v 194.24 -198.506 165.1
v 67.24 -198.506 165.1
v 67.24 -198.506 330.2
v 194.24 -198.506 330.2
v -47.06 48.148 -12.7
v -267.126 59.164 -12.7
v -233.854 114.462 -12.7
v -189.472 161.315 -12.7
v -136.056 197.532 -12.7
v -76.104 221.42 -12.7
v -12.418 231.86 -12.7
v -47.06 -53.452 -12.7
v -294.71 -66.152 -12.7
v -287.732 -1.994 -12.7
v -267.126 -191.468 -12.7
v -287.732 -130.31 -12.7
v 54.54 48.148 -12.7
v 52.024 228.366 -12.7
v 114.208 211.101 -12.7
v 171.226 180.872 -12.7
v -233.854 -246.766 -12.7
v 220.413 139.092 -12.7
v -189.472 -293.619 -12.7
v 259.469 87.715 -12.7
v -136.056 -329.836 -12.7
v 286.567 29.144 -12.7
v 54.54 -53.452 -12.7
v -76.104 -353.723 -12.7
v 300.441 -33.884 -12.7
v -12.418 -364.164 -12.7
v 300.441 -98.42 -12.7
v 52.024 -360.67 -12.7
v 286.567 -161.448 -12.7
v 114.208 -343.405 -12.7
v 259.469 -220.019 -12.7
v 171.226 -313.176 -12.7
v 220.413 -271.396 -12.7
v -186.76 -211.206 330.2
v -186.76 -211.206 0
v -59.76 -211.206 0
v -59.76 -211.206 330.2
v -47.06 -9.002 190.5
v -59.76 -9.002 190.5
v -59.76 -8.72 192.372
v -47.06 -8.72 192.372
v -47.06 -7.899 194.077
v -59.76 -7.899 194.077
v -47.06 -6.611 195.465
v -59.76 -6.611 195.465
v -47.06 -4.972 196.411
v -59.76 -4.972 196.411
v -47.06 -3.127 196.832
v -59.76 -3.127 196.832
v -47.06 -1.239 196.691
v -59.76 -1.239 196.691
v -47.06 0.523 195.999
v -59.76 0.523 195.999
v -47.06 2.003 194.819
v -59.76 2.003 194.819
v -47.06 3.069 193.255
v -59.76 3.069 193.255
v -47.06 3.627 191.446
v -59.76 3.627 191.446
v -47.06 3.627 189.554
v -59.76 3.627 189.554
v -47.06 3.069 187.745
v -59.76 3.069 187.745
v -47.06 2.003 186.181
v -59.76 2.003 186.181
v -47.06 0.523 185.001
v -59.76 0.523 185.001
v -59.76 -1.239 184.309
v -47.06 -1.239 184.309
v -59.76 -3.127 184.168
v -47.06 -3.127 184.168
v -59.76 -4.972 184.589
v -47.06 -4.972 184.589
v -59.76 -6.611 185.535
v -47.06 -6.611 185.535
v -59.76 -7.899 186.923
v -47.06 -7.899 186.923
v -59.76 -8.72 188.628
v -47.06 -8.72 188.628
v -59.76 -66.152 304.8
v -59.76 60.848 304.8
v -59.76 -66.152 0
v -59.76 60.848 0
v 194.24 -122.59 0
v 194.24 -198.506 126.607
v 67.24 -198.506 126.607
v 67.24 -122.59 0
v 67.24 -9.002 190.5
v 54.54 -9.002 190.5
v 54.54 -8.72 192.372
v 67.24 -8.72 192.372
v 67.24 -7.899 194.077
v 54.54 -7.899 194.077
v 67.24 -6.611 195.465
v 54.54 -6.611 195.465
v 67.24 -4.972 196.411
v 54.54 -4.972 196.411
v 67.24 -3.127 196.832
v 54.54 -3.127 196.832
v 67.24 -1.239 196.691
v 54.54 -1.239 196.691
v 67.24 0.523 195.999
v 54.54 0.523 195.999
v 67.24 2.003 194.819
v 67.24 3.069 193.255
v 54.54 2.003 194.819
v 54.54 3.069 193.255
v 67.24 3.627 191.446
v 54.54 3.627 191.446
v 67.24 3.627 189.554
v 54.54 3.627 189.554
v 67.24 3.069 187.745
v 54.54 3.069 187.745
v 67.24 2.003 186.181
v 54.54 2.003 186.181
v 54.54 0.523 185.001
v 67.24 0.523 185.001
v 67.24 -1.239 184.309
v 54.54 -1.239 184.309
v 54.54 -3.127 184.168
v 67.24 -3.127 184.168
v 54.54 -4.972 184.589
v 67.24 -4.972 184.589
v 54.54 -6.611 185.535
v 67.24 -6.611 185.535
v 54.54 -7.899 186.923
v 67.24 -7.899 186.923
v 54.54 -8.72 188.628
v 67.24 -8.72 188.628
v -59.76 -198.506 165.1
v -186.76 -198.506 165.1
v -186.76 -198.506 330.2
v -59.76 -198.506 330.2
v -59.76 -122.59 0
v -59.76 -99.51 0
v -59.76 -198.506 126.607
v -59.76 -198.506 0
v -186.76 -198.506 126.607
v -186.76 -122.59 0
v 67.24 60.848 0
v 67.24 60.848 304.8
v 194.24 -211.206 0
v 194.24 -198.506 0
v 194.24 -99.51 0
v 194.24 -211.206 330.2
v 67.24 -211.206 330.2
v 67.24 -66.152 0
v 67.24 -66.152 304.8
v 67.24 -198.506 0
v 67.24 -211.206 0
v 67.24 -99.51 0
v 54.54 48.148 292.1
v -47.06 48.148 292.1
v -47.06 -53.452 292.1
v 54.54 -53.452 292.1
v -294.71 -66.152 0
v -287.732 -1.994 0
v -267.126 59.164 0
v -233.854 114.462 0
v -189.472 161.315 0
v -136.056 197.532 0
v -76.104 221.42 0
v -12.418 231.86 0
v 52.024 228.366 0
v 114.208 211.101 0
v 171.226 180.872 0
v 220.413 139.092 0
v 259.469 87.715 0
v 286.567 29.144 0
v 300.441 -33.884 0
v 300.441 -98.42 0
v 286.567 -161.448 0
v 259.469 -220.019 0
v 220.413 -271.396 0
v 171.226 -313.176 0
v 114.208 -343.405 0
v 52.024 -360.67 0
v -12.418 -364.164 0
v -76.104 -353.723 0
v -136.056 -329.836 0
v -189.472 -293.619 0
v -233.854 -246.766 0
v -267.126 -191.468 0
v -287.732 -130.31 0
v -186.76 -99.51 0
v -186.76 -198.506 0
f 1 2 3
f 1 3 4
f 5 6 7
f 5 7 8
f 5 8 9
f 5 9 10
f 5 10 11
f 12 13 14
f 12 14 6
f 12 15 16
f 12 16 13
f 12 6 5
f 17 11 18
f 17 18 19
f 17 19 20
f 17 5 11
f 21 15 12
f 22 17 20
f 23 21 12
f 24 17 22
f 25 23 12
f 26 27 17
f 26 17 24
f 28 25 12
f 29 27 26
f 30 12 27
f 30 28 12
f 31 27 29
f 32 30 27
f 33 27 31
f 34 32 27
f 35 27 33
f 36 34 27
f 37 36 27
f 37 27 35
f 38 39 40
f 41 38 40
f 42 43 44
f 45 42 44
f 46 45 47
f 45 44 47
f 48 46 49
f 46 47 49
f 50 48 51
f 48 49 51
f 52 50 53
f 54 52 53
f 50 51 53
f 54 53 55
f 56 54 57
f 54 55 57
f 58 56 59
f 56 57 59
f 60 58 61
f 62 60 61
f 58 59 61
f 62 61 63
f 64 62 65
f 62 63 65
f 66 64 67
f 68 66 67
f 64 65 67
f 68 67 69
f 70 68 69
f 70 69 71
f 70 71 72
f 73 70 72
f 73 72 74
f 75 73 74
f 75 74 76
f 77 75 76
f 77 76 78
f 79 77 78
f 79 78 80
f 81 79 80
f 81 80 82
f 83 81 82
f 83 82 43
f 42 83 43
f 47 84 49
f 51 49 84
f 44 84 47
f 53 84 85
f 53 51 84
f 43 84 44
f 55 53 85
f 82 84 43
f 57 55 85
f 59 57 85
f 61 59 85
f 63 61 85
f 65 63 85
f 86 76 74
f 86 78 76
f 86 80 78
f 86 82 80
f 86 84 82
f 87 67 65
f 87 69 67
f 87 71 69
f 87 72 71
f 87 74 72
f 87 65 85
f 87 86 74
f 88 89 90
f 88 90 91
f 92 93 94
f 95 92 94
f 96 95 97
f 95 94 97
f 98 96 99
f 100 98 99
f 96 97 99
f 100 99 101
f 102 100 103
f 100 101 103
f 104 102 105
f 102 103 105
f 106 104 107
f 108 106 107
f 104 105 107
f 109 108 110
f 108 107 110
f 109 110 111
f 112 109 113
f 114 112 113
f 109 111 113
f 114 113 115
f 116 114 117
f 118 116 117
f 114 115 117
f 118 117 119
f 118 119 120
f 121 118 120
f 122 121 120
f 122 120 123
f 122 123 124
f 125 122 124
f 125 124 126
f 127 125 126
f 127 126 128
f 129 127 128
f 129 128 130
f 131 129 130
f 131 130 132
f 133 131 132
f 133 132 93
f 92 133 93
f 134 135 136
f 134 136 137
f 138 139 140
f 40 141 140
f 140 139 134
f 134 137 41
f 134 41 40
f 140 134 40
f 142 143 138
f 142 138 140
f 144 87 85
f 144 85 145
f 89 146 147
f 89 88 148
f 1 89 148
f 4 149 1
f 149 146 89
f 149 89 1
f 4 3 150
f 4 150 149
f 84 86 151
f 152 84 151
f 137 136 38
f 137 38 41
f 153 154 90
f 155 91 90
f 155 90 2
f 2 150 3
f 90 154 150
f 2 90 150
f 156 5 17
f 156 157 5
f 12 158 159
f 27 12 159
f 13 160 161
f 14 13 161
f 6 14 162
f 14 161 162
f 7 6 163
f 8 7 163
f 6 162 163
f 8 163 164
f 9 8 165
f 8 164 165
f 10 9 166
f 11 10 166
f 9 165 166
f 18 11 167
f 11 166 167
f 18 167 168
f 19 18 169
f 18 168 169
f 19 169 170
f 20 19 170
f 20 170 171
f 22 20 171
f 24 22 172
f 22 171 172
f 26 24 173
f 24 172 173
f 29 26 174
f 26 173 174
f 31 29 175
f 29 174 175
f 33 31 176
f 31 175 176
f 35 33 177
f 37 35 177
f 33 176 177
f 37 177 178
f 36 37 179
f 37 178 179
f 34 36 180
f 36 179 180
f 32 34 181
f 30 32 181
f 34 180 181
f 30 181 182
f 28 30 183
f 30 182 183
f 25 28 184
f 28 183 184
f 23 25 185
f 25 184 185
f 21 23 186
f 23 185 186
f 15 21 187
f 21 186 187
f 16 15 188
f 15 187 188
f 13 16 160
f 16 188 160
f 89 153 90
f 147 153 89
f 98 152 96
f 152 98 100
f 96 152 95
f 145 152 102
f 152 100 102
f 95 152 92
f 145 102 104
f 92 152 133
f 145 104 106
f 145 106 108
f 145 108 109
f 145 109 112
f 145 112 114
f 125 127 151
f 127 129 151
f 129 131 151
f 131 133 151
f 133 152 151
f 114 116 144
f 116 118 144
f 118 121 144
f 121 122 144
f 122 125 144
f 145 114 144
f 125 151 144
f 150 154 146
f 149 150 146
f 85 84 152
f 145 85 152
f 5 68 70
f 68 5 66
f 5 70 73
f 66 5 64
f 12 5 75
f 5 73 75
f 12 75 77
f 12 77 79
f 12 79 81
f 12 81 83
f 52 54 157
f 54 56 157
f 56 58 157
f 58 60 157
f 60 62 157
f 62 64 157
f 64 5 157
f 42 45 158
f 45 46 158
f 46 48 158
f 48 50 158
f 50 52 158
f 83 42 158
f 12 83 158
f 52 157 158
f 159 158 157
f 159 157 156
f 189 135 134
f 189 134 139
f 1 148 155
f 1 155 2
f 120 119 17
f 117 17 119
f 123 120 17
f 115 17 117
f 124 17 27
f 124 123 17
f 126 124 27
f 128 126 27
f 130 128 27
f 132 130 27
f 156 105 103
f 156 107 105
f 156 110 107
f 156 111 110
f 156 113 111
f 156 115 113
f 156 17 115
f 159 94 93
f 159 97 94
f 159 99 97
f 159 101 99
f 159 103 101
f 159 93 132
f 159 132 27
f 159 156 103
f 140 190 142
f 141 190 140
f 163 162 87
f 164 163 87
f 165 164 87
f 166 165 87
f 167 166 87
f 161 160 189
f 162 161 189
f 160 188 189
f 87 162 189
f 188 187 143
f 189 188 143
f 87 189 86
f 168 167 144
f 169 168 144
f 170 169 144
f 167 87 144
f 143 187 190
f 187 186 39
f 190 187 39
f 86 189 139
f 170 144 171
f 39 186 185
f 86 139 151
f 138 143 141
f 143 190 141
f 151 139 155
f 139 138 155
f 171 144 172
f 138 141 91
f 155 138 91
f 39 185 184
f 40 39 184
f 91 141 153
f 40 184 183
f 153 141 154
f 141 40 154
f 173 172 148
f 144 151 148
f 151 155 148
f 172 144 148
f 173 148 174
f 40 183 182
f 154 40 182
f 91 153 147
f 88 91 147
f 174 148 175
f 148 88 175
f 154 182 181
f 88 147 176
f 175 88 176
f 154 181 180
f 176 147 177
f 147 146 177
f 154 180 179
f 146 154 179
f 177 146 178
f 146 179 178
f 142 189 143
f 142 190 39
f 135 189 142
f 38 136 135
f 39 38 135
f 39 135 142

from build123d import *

# Parameters (mm, degrees)
F0_W      = 127
F0_H      = 127
F1_DEPTH  = 304.8
F2_W      = 101.6
F2_H      = 101.6
F3_DEPTH  = 292.1
F4_R      = 6.35
F5_DEPTH  = 127.001
F6_W      = 101.6
F6_H      = 101.6
F7_DEPTH  = 12.7
F8_W      = 127
F8_H      = 12.7
F9_DEPTH  = 330.2
F11_DEPTH = 127
F13_DEPTH = 127


with BuildPart() as f1:
    # F0 (on Top) → F1 (new body)
    with BuildSketch(Plane.XY):
        with Locations((3.740035, -2.651978)):
            Rectangle(F0_W, F0_H)
    extrude(amount=F1_DEPTH)

    # F2 (on face) → F3 (cut)
    with BuildSketch(Plane(origin=(0, 0, 0), x_dir=(1, 0, 0), z_dir=(0, 0, -1))):
        with Locations((3.740035, 2.651978)):
            Rectangle(F2_W, F2_H)
    extrude(amount=-F3_DEPTH, mode=Mode.SUBTRACT)

    # F4 (on face) → F5 (cut, through all)
    with BuildSketch(Plane(origin=(-59.759965, 0, 0), x_dir=(0, -1, 0), z_dir=(-1, 0, 0))):
        with Locations((2.651978, 190.5)):
            Circle(F4_R)
    extrude(amount=-F5_DEPTH, mode=Mode.SUBTRACT)

    # F6 (on face) → F7 (join)
    with BuildSketch(Plane(origin=(0, 0, 0), x_dir=(1, 0, 0), z_dir=(0, 0, -1))):
        with BuildLine():
            Line((3.740035, 66.151978), (302.190035, 66.151978))
            ThreePointArc((302.190035, 66.151978), (3.740035, 364.601978), (-294.709965, 66.151978))
            Line((-294.709965, 66.151978), (3.740035, 66.151978))
        make_face()
        with BuildLine():
            ThreePointArc((-294.709965, 66.151978), (3.740035, -232.298022), (302.190035, 66.151978))
            Line((302.190035, 66.151978), (3.740035, 66.151978))
            Line((3.740035, 66.151978), (-294.709965, 66.151978))
        make_face()
        with Locations((3.740035, 2.651978)):
            Rectangle(F6_W, F6_H, mode=Mode.SUBTRACT)
    extrude(amount=F7_DEPTH)

    # F8 (on face) → F9 (join)
    with BuildSketch(Plane.XY):
        with Locations((-123.259965, -204.855681)):
            Rectangle(F8_W, F8_H)
        with Locations((130.740035, -204.855681)):
            Rectangle(F8_W, F8_H)
    extrude(amount=F9_DEPTH)

    # F10 (on face) → F11 (join)
    with BuildSketch(Plane.YZ.offset(194.240035)):
        Polygon((-99.509686, 0), (-198.505681, 165.1), (-198.505681, 126.607434), (-122.590303, 0), align=None)
    extrude(amount=-F11_DEPTH)

    # F12 (on face) → F13 (join)
    with BuildSketch(Plane(origin=(-186.759965, 0, 0), x_dir=(0, -1, 0), z_dir=(-1, 0, 0))):
        Polygon((198.505681, 126.607495), (198.505681, 165.1), (99.509656, 0), (122.590244, 0), align=None)
    extrude(amount=-F13_DEPTH)


solid = f1.part
